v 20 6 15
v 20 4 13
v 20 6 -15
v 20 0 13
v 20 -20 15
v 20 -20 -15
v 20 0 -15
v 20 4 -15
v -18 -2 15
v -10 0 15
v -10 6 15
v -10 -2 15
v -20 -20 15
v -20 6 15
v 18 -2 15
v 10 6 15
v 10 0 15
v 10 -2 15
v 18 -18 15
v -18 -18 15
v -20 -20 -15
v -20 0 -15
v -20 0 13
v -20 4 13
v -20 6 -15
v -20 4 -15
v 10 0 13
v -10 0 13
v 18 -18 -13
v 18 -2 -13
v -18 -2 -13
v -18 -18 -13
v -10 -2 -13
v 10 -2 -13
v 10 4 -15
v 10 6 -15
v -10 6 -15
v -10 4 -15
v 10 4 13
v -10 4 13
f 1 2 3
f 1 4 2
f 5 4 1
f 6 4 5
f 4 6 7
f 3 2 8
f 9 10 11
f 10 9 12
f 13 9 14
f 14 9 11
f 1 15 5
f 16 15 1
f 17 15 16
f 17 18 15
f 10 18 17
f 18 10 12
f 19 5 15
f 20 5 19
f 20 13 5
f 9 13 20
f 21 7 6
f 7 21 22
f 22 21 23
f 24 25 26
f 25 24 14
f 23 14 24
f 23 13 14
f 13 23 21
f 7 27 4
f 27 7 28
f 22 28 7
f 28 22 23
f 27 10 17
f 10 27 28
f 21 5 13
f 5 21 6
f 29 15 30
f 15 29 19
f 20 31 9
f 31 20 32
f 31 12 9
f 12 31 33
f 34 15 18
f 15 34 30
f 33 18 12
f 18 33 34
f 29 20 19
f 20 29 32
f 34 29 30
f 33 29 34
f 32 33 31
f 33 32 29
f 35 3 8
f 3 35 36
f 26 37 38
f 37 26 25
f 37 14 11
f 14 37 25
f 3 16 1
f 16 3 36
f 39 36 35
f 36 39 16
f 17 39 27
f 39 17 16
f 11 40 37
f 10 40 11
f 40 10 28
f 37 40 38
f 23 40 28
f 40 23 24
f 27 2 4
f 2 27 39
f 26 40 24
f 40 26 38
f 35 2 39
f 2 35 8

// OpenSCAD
width = 40;
// width = 80;
depth = 20;
height = 30;
thin = 2;
belt = 10;
hook = 8;

translate([0, -(depth)/2, 0])
{
    pocket(width, depth, height, thin);
}
translate([0, (hook)/2-thin, 0])
{
    hooks(width, hook, height, belt, thin);
}

module pocket(width, depth, height, thin)
{
    difference()
    {
        cube([width, depth, height], true);
        cube([width-thin*2, depth-thin*2, height], true);
    }
    translate([0, 0, -(height-thin)/2])
    {
        cube([width, depth, thin], true);
    }
}

module hooks(width, hook, height, belt, thin)
{
    difference()
    {
        cube([width, hook, height], true);
        cube([width-belt*2, hook, height], true);
        translate([0, 0, -thin])
        {
            cube([width, hook-thin*2, height], true);
        }
    }
}
